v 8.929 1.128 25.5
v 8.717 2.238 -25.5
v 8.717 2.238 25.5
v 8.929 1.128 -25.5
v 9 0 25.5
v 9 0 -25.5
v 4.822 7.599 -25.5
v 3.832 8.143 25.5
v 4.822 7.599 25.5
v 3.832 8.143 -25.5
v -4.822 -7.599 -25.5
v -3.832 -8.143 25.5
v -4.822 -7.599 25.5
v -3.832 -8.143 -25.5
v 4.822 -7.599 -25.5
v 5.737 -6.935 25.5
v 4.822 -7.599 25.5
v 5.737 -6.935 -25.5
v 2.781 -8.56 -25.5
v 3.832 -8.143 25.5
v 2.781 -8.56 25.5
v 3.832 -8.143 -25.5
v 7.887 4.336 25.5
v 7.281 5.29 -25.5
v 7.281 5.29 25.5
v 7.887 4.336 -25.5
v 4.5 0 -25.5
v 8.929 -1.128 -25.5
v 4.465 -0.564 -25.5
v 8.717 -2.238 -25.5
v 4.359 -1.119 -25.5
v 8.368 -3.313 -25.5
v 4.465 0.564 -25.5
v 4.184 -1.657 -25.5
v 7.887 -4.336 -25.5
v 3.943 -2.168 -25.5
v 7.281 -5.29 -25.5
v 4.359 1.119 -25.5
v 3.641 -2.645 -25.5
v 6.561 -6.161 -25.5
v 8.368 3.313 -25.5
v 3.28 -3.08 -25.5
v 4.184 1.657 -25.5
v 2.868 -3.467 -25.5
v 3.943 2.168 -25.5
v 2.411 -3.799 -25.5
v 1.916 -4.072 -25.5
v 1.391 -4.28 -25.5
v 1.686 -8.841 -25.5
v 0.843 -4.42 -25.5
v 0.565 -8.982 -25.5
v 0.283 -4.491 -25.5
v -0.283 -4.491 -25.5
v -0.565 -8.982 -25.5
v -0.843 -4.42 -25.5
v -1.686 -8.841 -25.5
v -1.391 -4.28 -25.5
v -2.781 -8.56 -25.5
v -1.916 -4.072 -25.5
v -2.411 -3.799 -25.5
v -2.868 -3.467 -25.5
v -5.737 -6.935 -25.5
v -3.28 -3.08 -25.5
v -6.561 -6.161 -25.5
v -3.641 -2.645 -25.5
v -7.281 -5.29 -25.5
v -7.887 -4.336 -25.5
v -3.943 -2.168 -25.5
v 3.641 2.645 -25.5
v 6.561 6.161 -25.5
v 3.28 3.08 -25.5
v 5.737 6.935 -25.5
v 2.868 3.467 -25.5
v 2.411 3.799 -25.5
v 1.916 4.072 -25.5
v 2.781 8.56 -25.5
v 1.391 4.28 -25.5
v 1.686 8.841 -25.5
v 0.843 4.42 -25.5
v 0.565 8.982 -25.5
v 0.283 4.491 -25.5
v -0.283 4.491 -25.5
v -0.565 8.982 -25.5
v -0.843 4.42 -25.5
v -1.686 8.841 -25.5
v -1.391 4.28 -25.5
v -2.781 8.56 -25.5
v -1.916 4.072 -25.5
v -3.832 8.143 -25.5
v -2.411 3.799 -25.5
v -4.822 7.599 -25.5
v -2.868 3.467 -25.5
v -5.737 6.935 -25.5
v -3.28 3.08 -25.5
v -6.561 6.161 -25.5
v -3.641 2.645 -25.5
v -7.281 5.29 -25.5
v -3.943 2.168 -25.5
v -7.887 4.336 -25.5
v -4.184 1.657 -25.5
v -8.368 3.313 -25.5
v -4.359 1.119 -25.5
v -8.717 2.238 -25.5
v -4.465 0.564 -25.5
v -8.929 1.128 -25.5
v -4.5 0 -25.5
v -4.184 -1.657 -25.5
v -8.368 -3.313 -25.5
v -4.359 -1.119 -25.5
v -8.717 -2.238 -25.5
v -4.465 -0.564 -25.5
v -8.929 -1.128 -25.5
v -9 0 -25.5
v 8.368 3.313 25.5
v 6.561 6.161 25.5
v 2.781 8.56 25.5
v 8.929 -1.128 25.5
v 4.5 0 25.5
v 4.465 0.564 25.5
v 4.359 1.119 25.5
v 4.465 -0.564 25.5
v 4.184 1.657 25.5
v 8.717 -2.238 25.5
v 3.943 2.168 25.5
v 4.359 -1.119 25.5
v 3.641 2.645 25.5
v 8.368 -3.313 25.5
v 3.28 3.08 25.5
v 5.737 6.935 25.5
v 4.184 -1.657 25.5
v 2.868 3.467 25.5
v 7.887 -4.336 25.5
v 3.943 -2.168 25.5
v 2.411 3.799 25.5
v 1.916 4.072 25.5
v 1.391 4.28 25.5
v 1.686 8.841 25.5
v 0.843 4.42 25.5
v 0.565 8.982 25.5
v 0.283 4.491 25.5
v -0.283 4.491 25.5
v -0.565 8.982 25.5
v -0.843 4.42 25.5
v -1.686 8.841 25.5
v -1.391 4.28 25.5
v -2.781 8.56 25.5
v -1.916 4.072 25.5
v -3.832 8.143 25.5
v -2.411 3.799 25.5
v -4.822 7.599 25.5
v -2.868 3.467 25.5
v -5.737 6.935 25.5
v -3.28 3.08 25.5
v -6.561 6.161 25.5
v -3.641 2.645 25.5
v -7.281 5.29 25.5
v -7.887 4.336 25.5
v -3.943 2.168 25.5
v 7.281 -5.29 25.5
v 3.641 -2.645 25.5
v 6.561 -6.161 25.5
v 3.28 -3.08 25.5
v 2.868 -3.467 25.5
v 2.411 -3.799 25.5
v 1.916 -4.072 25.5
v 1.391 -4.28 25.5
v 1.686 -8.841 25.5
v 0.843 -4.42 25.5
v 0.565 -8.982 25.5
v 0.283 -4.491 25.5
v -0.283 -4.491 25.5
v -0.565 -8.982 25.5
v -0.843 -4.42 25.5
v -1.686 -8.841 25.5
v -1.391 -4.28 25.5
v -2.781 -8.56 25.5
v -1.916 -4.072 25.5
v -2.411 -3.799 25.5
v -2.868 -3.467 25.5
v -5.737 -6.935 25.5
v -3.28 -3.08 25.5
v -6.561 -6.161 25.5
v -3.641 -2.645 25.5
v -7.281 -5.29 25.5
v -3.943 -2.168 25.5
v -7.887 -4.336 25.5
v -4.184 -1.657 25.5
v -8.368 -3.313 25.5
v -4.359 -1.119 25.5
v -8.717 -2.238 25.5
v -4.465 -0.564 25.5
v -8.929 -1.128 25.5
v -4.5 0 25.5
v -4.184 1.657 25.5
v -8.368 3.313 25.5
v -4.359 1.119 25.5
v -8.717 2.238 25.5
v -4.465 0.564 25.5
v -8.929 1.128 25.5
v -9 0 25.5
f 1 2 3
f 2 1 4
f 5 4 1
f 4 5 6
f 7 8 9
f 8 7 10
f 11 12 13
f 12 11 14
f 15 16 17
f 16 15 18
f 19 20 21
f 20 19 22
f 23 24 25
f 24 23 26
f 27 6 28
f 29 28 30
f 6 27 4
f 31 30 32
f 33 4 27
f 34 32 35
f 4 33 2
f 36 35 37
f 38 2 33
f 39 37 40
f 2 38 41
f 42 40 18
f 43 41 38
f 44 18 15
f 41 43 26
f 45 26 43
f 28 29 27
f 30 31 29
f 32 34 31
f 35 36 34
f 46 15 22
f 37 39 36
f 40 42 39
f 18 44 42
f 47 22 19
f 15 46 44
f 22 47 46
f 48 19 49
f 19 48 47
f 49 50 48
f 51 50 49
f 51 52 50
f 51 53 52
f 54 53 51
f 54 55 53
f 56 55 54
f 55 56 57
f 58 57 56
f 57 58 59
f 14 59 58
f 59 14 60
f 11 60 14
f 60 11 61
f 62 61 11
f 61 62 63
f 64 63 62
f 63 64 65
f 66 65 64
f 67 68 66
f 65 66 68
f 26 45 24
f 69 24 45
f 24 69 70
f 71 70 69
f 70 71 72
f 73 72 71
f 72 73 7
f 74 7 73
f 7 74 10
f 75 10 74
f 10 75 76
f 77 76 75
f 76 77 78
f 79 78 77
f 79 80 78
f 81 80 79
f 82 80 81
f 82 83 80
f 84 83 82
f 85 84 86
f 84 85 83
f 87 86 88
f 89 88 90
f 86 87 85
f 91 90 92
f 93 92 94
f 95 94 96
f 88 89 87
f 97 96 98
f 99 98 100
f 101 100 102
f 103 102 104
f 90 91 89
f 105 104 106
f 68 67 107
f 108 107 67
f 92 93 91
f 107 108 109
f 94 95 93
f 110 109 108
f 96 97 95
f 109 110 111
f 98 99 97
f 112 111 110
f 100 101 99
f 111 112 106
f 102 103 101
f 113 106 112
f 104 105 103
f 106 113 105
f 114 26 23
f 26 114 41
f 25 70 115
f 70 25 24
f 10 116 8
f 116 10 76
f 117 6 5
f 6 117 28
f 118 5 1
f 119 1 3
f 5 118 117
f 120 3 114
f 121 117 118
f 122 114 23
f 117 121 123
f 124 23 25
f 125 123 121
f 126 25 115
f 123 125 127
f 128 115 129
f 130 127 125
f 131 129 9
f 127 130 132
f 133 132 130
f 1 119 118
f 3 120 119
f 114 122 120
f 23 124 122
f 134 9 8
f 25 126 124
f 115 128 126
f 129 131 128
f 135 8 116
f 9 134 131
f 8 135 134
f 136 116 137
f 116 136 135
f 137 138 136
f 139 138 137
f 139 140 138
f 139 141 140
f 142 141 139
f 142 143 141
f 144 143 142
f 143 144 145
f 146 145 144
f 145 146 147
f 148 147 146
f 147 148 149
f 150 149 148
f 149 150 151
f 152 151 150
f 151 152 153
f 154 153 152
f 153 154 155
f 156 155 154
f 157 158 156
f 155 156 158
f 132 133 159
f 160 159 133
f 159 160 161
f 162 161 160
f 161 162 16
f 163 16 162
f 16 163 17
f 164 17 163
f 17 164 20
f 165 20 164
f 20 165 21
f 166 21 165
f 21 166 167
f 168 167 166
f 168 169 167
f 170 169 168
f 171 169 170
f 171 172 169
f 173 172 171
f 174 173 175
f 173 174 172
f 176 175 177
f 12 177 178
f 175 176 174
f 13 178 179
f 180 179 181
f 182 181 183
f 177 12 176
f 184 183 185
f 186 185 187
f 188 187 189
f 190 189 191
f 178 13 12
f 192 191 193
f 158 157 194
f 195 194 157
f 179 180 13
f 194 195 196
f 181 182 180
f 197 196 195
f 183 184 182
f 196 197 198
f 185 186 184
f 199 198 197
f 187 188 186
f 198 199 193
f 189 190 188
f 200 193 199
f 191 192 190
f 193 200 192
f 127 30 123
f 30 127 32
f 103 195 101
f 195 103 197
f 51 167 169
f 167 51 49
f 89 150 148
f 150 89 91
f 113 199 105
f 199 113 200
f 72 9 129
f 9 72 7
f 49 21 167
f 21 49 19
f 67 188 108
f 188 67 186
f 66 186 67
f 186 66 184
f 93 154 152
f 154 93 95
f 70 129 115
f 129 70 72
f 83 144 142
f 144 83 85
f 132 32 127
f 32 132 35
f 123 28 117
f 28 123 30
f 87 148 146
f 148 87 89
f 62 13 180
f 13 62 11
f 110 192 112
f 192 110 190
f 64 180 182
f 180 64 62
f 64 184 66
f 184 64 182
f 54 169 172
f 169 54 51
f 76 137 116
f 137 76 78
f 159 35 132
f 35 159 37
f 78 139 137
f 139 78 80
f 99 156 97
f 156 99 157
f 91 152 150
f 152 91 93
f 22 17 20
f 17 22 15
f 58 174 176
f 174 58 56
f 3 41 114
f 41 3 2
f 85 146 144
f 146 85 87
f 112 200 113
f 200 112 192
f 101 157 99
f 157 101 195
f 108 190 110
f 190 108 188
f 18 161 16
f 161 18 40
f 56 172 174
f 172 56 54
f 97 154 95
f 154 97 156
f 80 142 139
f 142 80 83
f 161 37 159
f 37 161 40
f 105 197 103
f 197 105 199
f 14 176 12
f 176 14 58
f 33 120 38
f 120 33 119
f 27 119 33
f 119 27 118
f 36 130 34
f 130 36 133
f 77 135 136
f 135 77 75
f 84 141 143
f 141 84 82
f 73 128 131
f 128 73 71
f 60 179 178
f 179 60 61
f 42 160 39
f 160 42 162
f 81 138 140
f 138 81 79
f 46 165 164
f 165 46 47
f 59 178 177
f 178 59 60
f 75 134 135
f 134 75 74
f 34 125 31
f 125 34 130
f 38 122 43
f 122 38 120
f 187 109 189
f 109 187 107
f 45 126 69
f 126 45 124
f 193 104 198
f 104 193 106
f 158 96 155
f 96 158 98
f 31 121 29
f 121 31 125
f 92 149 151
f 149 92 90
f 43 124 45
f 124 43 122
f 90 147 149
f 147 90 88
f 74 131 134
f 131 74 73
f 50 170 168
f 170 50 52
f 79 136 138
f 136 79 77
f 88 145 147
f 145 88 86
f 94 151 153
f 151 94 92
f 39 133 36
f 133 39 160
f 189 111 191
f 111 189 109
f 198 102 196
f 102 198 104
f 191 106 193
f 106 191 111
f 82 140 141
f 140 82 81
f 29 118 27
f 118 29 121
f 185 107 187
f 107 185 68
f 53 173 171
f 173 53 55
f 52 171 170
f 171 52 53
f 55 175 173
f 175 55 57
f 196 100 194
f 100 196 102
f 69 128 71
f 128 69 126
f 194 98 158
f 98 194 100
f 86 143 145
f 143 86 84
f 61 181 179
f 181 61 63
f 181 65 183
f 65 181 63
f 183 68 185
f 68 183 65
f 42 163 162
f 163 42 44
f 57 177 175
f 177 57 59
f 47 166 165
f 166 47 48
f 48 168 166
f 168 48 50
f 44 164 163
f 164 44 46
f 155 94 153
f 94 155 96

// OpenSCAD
$fn = 50;


difference() {
	union() {
		translate(v = [0, 0, -25.5000000000]) {
			cylinder(h = 51, r = 9.0000000000);
		}
	}
	union() {
		translate(v = [0, 0, -100.0000000000]) {
			cylinder(h = 200, r = 4.5000000000);
		}
	}
}
